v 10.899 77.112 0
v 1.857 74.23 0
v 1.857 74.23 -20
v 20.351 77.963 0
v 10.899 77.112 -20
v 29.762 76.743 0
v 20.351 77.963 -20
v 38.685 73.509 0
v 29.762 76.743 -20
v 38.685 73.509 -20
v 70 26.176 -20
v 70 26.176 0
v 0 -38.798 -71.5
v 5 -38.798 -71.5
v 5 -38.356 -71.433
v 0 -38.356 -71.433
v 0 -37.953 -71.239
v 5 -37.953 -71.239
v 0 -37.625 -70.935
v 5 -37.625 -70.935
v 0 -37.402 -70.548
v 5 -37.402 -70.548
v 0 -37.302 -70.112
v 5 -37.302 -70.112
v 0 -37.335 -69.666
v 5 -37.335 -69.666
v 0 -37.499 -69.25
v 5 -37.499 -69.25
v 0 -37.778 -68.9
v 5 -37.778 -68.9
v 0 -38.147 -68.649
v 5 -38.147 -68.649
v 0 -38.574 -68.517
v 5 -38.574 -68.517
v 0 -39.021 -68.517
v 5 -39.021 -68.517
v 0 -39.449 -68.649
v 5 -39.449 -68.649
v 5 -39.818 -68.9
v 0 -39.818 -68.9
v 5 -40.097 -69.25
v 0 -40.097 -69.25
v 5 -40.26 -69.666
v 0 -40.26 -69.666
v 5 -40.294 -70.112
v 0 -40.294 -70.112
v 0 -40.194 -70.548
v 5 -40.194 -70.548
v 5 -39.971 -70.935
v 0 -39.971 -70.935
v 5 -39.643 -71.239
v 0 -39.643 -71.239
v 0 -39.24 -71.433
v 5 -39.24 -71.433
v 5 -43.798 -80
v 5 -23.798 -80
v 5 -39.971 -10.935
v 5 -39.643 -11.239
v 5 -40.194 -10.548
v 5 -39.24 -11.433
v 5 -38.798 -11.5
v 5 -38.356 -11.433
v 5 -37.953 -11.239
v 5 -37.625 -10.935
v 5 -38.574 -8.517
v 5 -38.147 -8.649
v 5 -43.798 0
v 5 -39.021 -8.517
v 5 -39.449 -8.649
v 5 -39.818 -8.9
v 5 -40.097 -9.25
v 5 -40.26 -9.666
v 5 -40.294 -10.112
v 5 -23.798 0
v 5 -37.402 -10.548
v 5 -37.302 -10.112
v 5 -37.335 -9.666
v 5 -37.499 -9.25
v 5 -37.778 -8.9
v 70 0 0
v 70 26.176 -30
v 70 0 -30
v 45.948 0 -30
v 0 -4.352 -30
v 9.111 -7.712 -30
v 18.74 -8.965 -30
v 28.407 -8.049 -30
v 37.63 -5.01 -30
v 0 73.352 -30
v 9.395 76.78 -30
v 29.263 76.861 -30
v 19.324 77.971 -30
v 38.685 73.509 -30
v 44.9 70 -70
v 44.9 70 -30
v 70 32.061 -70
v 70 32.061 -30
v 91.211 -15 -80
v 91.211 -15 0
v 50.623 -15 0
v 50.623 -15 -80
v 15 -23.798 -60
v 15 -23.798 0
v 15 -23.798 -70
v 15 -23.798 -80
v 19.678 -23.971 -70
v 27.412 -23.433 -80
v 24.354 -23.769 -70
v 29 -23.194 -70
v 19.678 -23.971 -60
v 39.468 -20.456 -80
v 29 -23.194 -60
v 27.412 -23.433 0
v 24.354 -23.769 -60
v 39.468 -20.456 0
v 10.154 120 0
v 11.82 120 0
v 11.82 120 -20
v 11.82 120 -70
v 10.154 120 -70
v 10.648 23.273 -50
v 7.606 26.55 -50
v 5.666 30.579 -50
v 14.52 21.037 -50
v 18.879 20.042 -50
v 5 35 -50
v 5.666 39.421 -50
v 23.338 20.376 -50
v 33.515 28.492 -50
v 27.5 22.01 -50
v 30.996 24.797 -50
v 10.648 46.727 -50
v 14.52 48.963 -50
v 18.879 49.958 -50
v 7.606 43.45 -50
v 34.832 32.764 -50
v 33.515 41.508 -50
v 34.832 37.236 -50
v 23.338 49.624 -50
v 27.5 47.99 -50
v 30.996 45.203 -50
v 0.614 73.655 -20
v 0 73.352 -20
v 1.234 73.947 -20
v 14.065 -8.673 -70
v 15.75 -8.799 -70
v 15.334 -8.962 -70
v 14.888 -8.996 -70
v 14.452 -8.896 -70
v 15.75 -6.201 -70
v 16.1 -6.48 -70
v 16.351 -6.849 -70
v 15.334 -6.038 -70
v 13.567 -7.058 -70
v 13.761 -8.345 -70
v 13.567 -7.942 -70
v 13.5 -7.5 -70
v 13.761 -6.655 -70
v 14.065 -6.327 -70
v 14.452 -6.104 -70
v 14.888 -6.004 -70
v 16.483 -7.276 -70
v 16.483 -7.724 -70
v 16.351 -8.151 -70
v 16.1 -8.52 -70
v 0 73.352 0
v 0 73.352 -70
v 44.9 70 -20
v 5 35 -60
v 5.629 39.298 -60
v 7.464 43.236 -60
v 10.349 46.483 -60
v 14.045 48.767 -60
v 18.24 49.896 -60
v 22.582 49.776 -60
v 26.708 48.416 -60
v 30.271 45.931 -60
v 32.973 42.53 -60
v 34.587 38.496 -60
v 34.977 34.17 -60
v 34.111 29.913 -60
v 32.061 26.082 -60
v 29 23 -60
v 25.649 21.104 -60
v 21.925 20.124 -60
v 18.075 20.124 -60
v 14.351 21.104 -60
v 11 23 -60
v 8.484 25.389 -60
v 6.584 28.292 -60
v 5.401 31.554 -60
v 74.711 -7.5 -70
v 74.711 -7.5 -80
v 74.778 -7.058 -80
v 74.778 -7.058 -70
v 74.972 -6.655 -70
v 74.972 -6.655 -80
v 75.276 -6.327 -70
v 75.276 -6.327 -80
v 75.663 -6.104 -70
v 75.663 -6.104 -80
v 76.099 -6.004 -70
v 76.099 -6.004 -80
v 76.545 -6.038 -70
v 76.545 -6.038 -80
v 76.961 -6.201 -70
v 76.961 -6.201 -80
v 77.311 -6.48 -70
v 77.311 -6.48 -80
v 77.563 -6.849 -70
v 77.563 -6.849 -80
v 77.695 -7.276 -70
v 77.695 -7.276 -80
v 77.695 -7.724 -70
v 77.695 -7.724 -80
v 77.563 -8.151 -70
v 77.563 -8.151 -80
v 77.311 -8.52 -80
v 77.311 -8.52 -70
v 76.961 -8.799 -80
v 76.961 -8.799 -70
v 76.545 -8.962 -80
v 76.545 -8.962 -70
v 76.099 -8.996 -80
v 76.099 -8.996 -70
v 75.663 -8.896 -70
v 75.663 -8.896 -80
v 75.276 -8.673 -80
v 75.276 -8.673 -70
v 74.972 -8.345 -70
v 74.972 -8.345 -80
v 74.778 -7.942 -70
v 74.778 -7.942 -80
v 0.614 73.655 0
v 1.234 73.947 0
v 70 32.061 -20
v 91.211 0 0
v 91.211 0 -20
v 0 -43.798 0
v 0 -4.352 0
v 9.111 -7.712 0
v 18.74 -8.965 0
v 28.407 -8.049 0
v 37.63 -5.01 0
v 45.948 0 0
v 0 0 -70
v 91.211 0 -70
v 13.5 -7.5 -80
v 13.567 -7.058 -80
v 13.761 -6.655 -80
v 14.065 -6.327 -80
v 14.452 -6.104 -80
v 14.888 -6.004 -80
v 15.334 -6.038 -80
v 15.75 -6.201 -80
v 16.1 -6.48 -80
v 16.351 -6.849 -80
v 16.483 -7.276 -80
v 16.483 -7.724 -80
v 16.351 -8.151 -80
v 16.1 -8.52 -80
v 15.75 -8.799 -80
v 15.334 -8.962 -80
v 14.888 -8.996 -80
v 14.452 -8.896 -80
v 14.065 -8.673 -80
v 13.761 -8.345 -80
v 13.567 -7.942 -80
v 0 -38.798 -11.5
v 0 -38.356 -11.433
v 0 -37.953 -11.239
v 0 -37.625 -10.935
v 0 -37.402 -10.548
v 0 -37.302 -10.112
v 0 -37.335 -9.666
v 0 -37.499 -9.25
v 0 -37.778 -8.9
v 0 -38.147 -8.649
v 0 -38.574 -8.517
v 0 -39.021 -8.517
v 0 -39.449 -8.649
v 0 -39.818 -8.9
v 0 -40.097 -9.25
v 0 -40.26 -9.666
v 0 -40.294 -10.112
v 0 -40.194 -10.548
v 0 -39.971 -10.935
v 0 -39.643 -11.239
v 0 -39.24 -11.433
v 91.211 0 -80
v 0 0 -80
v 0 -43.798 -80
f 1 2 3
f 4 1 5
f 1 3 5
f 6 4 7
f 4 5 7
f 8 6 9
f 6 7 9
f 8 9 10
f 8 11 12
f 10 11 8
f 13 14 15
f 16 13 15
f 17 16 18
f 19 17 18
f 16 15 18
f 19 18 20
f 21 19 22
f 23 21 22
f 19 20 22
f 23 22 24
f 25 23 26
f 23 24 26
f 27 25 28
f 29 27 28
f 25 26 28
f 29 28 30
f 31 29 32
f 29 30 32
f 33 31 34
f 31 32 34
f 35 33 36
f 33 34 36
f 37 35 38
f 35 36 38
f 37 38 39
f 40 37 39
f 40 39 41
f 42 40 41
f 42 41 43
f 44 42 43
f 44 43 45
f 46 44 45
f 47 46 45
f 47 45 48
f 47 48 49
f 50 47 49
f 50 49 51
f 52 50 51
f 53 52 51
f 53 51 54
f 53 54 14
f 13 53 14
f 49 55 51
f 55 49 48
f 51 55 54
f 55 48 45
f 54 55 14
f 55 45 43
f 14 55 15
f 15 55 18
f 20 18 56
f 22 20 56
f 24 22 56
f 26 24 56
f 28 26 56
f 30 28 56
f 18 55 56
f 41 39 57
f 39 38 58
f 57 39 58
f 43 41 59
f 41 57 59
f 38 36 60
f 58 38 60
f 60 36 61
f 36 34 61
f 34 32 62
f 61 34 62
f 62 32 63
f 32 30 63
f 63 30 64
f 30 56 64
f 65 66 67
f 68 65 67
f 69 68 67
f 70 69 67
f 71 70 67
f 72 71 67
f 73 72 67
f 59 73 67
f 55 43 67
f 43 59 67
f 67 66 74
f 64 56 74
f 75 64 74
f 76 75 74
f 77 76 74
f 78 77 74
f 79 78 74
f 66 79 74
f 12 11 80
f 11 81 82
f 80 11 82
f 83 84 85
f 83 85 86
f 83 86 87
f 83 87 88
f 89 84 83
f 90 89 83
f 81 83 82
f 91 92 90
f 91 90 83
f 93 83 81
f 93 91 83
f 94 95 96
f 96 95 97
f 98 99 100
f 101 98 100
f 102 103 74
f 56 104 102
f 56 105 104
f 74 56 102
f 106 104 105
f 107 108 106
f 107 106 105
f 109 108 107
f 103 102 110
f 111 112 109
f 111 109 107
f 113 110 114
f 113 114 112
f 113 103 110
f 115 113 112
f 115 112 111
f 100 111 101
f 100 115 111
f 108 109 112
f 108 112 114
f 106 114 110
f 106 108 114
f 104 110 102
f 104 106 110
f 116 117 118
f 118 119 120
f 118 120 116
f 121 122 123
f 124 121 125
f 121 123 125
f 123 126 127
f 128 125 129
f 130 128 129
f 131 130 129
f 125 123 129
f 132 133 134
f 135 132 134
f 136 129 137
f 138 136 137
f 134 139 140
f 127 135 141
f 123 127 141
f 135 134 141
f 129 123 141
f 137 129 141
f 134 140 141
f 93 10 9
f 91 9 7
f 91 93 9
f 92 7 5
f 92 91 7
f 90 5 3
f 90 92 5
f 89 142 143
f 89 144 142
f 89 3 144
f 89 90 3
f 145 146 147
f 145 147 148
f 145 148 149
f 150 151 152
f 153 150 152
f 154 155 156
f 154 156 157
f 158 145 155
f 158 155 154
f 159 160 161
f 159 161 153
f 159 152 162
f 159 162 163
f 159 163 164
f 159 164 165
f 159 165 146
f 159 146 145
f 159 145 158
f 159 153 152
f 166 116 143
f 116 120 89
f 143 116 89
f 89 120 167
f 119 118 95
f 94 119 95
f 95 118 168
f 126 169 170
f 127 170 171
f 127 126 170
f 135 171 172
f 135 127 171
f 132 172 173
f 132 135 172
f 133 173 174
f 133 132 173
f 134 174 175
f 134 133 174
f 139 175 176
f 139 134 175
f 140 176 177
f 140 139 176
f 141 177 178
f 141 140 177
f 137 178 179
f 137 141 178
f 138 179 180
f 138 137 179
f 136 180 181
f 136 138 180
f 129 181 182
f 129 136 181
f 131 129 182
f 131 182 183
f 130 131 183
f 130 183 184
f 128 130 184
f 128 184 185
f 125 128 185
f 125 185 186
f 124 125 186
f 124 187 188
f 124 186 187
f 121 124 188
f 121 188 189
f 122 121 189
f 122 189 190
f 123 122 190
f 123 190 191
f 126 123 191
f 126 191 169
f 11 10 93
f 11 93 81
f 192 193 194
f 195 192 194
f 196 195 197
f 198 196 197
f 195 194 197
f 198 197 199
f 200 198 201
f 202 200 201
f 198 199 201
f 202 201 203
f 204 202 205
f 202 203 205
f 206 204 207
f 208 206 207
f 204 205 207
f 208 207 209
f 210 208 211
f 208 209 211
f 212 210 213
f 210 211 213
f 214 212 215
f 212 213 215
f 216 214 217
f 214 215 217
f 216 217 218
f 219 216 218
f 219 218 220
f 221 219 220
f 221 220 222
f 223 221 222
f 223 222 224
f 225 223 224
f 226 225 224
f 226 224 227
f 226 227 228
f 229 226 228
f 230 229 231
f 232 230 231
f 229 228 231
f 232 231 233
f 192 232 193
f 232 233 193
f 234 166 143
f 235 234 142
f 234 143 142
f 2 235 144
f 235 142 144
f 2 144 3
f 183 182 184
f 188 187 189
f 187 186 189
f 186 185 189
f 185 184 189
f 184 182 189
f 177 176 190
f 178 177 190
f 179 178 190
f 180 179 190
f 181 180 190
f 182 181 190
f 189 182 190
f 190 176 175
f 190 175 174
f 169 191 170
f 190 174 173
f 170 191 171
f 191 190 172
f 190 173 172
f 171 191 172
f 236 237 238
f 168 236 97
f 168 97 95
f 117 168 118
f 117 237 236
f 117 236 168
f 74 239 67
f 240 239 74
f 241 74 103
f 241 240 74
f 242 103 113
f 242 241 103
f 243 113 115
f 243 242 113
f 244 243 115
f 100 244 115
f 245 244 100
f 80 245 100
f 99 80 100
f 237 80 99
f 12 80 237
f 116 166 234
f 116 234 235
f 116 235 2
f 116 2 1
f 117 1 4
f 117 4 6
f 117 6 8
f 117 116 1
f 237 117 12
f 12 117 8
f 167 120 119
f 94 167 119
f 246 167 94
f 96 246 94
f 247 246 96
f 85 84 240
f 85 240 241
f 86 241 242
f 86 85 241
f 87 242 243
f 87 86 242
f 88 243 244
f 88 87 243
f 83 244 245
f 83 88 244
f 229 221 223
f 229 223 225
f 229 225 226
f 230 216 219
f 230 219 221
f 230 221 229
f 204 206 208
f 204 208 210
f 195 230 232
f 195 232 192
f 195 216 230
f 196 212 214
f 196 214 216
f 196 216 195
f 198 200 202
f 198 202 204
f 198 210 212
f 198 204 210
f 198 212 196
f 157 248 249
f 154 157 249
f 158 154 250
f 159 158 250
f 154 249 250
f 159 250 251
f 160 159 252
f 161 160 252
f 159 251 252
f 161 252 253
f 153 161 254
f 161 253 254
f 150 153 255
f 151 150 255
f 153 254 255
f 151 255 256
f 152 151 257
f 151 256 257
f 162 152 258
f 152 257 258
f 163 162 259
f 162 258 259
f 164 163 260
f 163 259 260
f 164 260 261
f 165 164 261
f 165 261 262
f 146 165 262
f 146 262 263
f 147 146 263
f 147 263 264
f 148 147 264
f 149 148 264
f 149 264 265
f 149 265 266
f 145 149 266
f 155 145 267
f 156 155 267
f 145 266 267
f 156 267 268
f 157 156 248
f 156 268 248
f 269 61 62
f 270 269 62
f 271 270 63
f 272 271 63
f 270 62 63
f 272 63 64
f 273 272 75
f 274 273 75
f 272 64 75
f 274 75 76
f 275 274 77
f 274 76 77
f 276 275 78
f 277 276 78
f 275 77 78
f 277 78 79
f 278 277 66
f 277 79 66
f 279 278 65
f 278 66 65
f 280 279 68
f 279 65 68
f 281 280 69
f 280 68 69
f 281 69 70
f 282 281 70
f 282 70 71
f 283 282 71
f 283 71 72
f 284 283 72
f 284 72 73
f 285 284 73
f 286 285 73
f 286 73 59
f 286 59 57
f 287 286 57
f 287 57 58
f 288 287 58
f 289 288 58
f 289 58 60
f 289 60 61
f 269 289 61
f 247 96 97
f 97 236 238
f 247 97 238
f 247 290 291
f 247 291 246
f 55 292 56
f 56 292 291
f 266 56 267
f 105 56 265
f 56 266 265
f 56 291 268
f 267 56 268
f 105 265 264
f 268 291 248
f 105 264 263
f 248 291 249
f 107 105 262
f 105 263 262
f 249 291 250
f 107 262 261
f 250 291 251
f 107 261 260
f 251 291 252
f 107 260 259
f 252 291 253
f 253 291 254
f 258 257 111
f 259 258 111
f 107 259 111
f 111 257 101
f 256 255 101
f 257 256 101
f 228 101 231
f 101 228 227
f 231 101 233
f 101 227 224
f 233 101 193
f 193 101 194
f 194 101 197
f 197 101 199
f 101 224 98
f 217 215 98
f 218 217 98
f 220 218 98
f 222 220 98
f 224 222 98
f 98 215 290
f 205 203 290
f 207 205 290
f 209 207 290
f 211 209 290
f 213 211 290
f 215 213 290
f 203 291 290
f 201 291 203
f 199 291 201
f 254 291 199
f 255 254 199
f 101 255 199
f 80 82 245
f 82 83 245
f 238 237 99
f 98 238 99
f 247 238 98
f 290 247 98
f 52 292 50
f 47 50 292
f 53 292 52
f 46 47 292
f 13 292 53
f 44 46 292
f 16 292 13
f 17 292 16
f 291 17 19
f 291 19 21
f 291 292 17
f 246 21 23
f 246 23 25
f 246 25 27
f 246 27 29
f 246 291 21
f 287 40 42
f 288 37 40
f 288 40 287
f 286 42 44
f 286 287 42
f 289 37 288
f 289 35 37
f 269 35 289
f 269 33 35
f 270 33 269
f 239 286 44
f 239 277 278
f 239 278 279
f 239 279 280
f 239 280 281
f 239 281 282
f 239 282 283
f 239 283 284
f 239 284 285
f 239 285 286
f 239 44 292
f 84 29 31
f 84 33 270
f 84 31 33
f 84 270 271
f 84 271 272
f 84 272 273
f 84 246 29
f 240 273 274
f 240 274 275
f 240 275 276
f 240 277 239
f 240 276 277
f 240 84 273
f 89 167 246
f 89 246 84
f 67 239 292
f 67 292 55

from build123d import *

# Parameters (mm, degrees)
EXTRUDE_1_DEPTH           = 30
EXTRUDE_2_DEPTH           = 210
SKETCH_8_W                = 25
SKETCH_8_H                = 120
EXTRUDE_5_DEPTH           = 70
SKETCH_9_W                = 25
SKETCH_9_H                = 60
EXTRUDE_6_DEPTH           = 60
SKETCH_10_R               = 7.5
CUT_EXTRUDE_3_DEPTH       = 402.372644808
EXTRUDE_7_DEPTH           = 60
EXTRUDE_8_REACH           = 392.16
SKETCH_12_R               = 2.5
SKETCH_14_W               = 125
SKETCH_14_H               = 50
EXTRUDE_9_DEPTH           = 120
SKETCH_15_W               = 70
SKETCH_15_H               = 70
CUT_EXTRUDE_4_DEPTH       = 10
CUT_EXTRUDE_5_DEPTH       = 20
SKETCH_17_R               = 43.471266984
CUT_EXTRUDE_6_DEPTH       = 428.317212384
EXTRUDE_10_DEPTH          = 20
EXTRUDE_11_DEPTH          = 20
CUT_EXTRUDE_7_DEPTH       = 434.012701892
CUT_EXTRUDE_8_DEPTH       = 434.012701892
EXTRUDE_19_REACH          = 446.86
EXTRUDE_20_DEPTH          = 20
EXTRUDE_21_DEPTH          = 20
EXTRUDE_START             = 20
EXTRUDE_22_DEPTH          = 20
CUT_EXTRUDE_9_DEPTH       = 30
CUT_EXTRUDE_11_DEPTH      = 407.201920232
CUT_EXTRUDE_11_DEPTH_BACK = 407.201920232
SKETCH_29_R               = 15
EXTRUDE_23_DEPTH          = 78.203243
SKETCH_33_W               = 30
SKETCH_33_H               = 40
CUT_EXTRUDE_14_DEPTH      = 20
SKETCH_34_W               = 18
SKETCH_34_H               = 35.300600551
CUT_EXTRUDE_15_DEPTH      = 10
CUT_EXTRUDE_16_DEPTH      = 10
SKETCH_36_RX              = 24.05
SKETCH_36_RY              = 15.9
SKETCH_36_R               = 15.9
CUT_EXTRUDE_17_DEPTH      = 4
SKETCH_37_W               = 148.788525811
SKETCH_37_H               = 80
CUT_EXTRUDE_18_DEPTH      = 445.859528391
SKETCH_38_W               = 76.211474189
SKETCH_38_H               = 51.3
CUT_EXTRUDE_20_DEPTH      = 80
CUT_EXTRUDE_START         = -81
CUT_EXTRUDE_21_DEPTH      = 81
CUT_EXTRUDE_22_DEPTH      = 402.372644808
SKETCH_41_W               = 18
SKETCH_41_H               = 10
CUT_EXTRUDE_23_DEPTH      = 60
SKETCH_44_W               = 50
SKETCH_44_H               = 109
EXTRUDE_26_DEPTH          = 15
SKETCH_45_W               = 50
SKETCH_45_H               = 109
EXTRUDE_27_DEPTH          = 15
EXTRUDE_28_DEPTH          = 15
SKETCH_47_W               = 15
SKETCH_47_H               = 50.339258453
CUT_EXTRUDE_24_DEPTH      = 109
CUT_EXTRUDE_25_DEPTH      = 445.859528391
CUT_EXTRUDE_26_DEPTH      = 15
SKETCH_50_W               = 5
SKETCH_50_H               = 80
EXTRUDE_29_DEPTH          = 20
SKETCH_51_R               = 1.5
CUT_EXTRUDE_27_DEPTH      = 20
EXTRUDE_30_DEPTH          = 20
EXTRUDE_31_DEPTH          = 10
SKETCH_54_R               = 1.5
CUT_EXTRUDE_28_DEPTH      = 10


with BuildPart() as part:
    # 草图1 → 凸台-拉伸1 (new body)
    with BuildSketch(Plane(origin=(0, 0, 0), x_dir=(0, 0, -1), z_dir=(1, 0, 0))):
        with BuildLine():
            Line((0, 0), (270, 0))
            Line((270, 0), (270, -100.282814983))
            ThreePointArc((270, -100.282814983), (264.178138298, -118.691056762), (248.830033233, -130.404003019))
            Line((248.830033233, -130.404003019), (142.45524498, -168.69892679))
            ThreePointArc((142.45524498, -168.69892679), (135, -170), (127.54475502, -168.69892679))
            Line((127.54475502, -168.69892679), (21.169966767, -130.404003019))
            ThreePointArc((21.169966767, -130.404003019), (5.821861702, -118.691056762), (0, -100.282814983))
            Line((0, -100.282814983), (0, 0))
        make_face()
    extrude(amount=EXTRUDE_1_DEPTH)

    # 草图2 → 凸台-拉伸2 (add)
    with BuildSketch(Plane(origin=(30, 0, 0), x_dir=(0, 0, -1), z_dir=(1, 0, 0))):
        with BuildLine():
            Line((105, -160.582814983), (105, 0))
            Line((105, 0), (0, 0))
            Line((0, 0), (0, -100.282814983))
            ThreePointArc((0, -100.282814983), (5.821861702, -118.691056762), (21.169966767, -130.404003019))
            Line((21.169966767, -130.404003019), (105, -160.582814983))
        make_face()
        with BuildLine():
            Line((270, 0), (165, 0))
            Line((165, 0), (165, -160.582814983))
            Line((165, -160.582814983), (248.830033233, -130.404003019))
            ThreePointArc((248.830033233, -130.404003019), (264.178138298, -118.691056762), (270, -100.282814983))
            Line((270, -100.282814983), (270, 0))
        make_face()
    extrude(amount=EXTRUDE_2_DEPTH)

    # 草图8 → 凸台-拉伸5 (add)
    with BuildSketch(Plane(origin=(240, 0, 0), x_dir=(0, 0, -1), z_dir=(1, 0, 0))):
        with Locations((92.5, 0)):
            Rectangle(SKETCH_8_W, SKETCH_8_H)
        with Locations((177.5, 0)):
            Rectangle(SKETCH_8_W, SKETCH_8_H)
    extrude(amount=EXTRUDE_5_DEPTH)

    # 草图9 → 凸台-拉伸6 (add)
    with BuildSketch(Plane.ZY.offset(-240)):
        with Locations((-92.5, 30)):
            Rectangle(SKETCH_9_W, SKETCH_9_H)
        with Locations((-177.5, 30)):
            Rectangle(SKETCH_9_W, SKETCH_9_H)
    extrude(amount=EXTRUDE_6_DEPTH)

    # 草图10 → 切除-拉伸3 (cut, through all)
    with BuildSketch(Plane.XY.offset(-80)):
        with Locations((270, 30)):
            Circle(SKETCH_10_R)
    extrude(amount=-CUT_EXTRUDE_3_DEPTH, mode=Mode.SUBTRACT)

    # 草图11 → 凸台-拉伸7 (add)
    with BuildSketch(Plane(origin=(0, 0, -105), x_dir=(-1, 0, 0), z_dir=(0, 0, -1))):
        with BuildLine():
            Line((-30, -40), (-30, -160.582814983))
            Line((-30, -160.582814983), (-108.203242822, -160.582814983))
            ThreePointArc((-108.203242822, -160.582814983), (-60.24964282, -106.032303748), (-30, -40))
        make_face()
    extrude(amount=EXTRUDE_7_DEPTH)

    # 草图12 → 凸台-拉伸8 (add, up to next)
    with BuildSketch(Plane.XY.offset(-165), mode=Mode.PRIVATE) as extrude_8_sk1:
        with Locations(Location((70, -45, 0), (0, 0, 180))):
            Circle(SKETCH_12_R)
    extrude_8_tool1 = extrude(extrude_8_sk1.sketch, amount=EXTRUDE_8_REACH, mode=Mode.PRIVATE) - part.part
    add(extrude_8_tool1.solids().sort_by_distance((70, -45, -165))[0])

    # 草图14 → 凸台-拉伸9 (add)
    with BuildSketch(Plane(origin=(0, 0, 0), x_dir=(1, 0, 0), z_dir=(0, 1, 0))):
        with Locations((62.5, 225)):
            Rectangle(SKETCH_14_W, SKETCH_14_H)
        with Locations((62.5, 45)):
            Rectangle(SKETCH_14_W, SKETCH_14_H)
    extrude(amount=EXTRUDE_9_DEPTH)

    # 草图15 → 切除-拉伸4 (cut)
    with BuildSketch(Plane.XY.offset(-20)):
        with Locations((35, 35)):
            Rectangle(SKETCH_15_W, SKETCH_15_H)
    extrude(amount=-CUT_EXTRUDE_4_DEPTH, mode=Mode.SUBTRACT)

    # 草图16 → 切除-拉伸5 (cut)
    with BuildSketch(Plane.XY.offset(-30)):
        Polygon((35, 15), (5, 15), (5, 55), (35, 55), (35, 35), align=None)
    extrude(amount=-CUT_EXTRUDE_5_DEPTH, mode=Mode.SUBTRACT)

    # 草图17 → 切除-拉伸6 (cut, through all)
    with BuildSketch(Plane.XY.offset(-30)):
        with Locations((19.5, 34.5)):
            Circle(SKETCH_17_R)
    extrude(amount=CUT_EXTRUDE_6_DEPTH, mode=Mode.SUBTRACT)

    # 草图18 → 凸台-拉伸10 (add)
    with BuildSketch(Plane.XY.offset(-20)):
        Polygon((11.819921283, 120), (91.211474189, 0), (87.317867735, 0), (10.741661946, 115.744614613), align=None)
    extrude(amount=EXTRUDE_10_DEPTH)

    # 草图19 → 凸台-拉伸11 (add)
    with BuildSketch(Plane.XY.offset(-20)):
        with BuildLine():
            Line((1.857343832, 74.230186717), (10.856035233, 115.571739869))
            Line((10.856035233, 115.571739869), (10.741661946, 115.744614613))
            Line((10.741661946, 115.744614613), (11.819921283, 120))
            Line((11.819921283, 120), (10.153664863, 120))
            Line((10.153664863, 120), (0, 73.352297914))
            ThreePointArc((0, 73.352297914), (0.923485284, 73.80221564), (1.857343832, 74.230186717))
        make_face()
    extrude(amount=EXTRUDE_11_DEPTH)

    # 草图20 → 切除-拉伸7 (cut, through all)
    with BuildSketch(Plane.XY.offset(-20)):
        Polygon((0, 120), (0, 73.352297914), (10.153664863, 120), align=None)
    extrude(amount=-CUT_EXTRUDE_7_DEPTH, mode=Mode.SUBTRACT)

    # 草图22 → 切除-拉伸8 (cut, through all)
    with BuildSketch(Plane.XY.offset(-20)):
        Polygon((44.899734993, 70), (70, 32.061054476), (91.211474189, 0), (125, 0), (125, 120), (11.819921283, 120), align=None)
    extrude(amount=-CUT_EXTRUDE_8_DEPTH, mode=Mode.SUBTRACT)

    # 草图23 → 凸台-拉伸19 (add, up to next)
    with BuildSketch(Plane.XY, mode=Mode.PRIVATE) as extrude_19_sk1:
        with BuildLine():
            Line((87.317867735, 0), (91.211474189, 0))
            Line((91.211474189, 0), (11.819921283, 120))
            Line((11.819921283, 120), (10.153664863, 120))
            Line((10.153664863, 120), (0, 73.352297914))
            ThreePointArc((0, 73.352297914), (0.923485284, 73.80221564), (1.857343832, 74.230186717))
            Line((1.857343832, 74.230186717), (10.856035233, 115.571739869))
            Line((10.856035233, 115.571739869), (87.317867735, 0))
        make_face()
    extrude_19_tool1 = extrude(extrude_19_sk1.sketch, amount=-EXTRUDE_19_REACH, mode=Mode.PRIVATE) - part.part
    add(extrude_19_tool1.solids().sort_by_distance((89.264671, 1.5073, 0))[0])

    # 草图24 → 凸台-拉伸20 (add)
    with BuildSketch(Plane.XY.offset(-20)):
        Polygon((87.317867735, 0), (70, 26.175884614), (70, 0), align=None)
    extrude(amount=EXTRUDE_20_DEPTH)

    # 草图25 → 凸台-拉伸21 (add)
    with BuildSketch(Plane.XY.offset(-20)):
        with BuildLine():
            Line((38.684579851, 73.509011127), (10.856035233, 115.571739869))
            Line((10.856035233, 115.571739869), (1.857343832, 74.230186717))
            ThreePointArc((1.857343832, 74.230186717), (20.351120273, 77.962934179), (38.684579851, 73.509011127))
        make_face()
    extrude(amount=EXTRUDE_21_DEPTH)

    # 草图26 → 凸台-拉伸22 (add)
    with BuildSketch(Plane(origin=(0, 0, -250), x_dir=(-1, 0, 0), z_dir=(0, 0, -1)).offset(EXTRUDE_START)):
        with BuildLine():
            Line((-70, 26.175884614), (-38.684579851, 73.509011127))
            ThreePointArc((-38.684579851, 73.509011127), (-19.323897117, 77.970910285), (0, 73.352297914))
            Line((0, 73.352297914), (-10.153664863, 120))
            Line((-10.153664863, 120), (-11.819921283, 120))
            Line((-11.819921283, 120), (-91.211474189, 0))
            Line((-91.211474189, 0), (-240, 0))
            Line((-240, 0), (-240, -100.282814983))
            Line((-240, -100.282814983), (0, -100.282814983))
            Line((0, -100.282814983), (0, -4.352297914))
            ThreePointArc((0, -4.352297914), (-23.599339693, -8.77755154), (-45.948082222, 0))
            Line((-45.948082222, 0), (-70, 0))
            Line((-70, 0), (-70, 26.175884614))
        make_face()
    extrude(amount=-EXTRUDE_22_DEPTH)

    # 草图27 → 切除-拉伸9 (cut)
    with BuildSketch(Plane(origin=(0, 0, -270), x_dir=(-1, 0, 0), z_dir=(0, 0, -1))):
        with BuildLine():
            Line((-38.684579851, 73.509011127), (-70, 26.175884614))
            Line((-70, 26.175884614), (-70, 0))
            Line((-70, 0), (-45.948082222, 0))
            ThreePointArc((-45.948082222, 0), (-23.599339693, -8.77755154), (0, -4.352297914))
            Line((0, -4.352297914), (0, 73.352297914))
            ThreePointArc((0, 73.352297914), (-19.323897117, 77.970910285), (-38.684579851, 73.509011127))
        make_face()
    extrude(amount=-CUT_EXTRUDE_9_DEPTH, mode=Mode.SUBTRACT)

    # 草图29 → 切除-拉伸11 (cut, two sides: drawn at the far end of the back side and taken through both)
    with BuildSketch(Plane(origin=(0, 0, -70), x_dir=(-1, 0, 0), z_dir=(0, 0, -1)).offset(-CUT_EXTRUDE_11_DEPTH_BACK)):
        with Locations((-20, 35)):
            Circle(SKETCH_29_R)
    extrude(amount=CUT_EXTRUDE_11_DEPTH + CUT_EXTRUDE_11_DEPTH_BACK, mode=Mode.SUBTRACT)

    # 草图30 → 凸台-拉伸23 (add)
    with BuildSketch(Plane(origin=(30, 0, 0), x_dir=(0, 0, -1), z_dir=(1, 0, 0))):
        with BuildLine():
            Line((142.45524498, -168.69892679), (165, -160.582814983))
            Line((165, -160.582814983), (105, -160.582814983))
            Line((105, -160.582814983), (127.54475502, -168.69892679))
            ThreePointArc((127.54475502, -168.69892679), (135, -170), (142.45524498, -168.69892679))
        make_face()
    extrude(amount=EXTRUDE_23_DEPTH)

    # 草图33 → 切除-拉伸14 (cut)
    with BuildSketch(Plane(origin=(0, 0, -240), x_dir=(-1, 0, 0), z_dir=(0, 0, -1))):
        with Locations((-20, 35)):
            Rectangle(SKETCH_33_W, SKETCH_33_H)
    extrude(amount=-CUT_EXTRUDE_14_DEPTH, mode=Mode.SUBTRACT)

    # 草图34 → 切除-拉伸15 (cut)
    with BuildSketch(Plane.XY.offset(-200)):
        with Locations((20, 17.650300276)):
            Rectangle(SKETCH_34_W, SKETCH_34_H)
    extrude(amount=-CUT_EXTRUDE_15_DEPTH, mode=Mode.SUBTRACT)

    # 草图35 → 切除-拉伸16 (cut)
    with BuildSketch(Plane(origin=(0, 0, -70), x_dir=(-1, 0, 0), z_dir=(0, 0, -1))):
        with BuildLine():
            Line((-11, 0), (-11, 23))
            ThreePointArc((-11, 23), (-20, 20), (-29, 23))
            Line((-29, 23), (-29, 0))
            Line((-29, 0), (-11, 0))
        make_face()
    extrude(amount=-CUT_EXTRUDE_16_DEPTH, mode=Mode.SUBTRACT)

    # 草图36 → 切除-拉伸17 (cut)
    # profile 1 of 6: a face of its own
    with BuildSketch(Plane.ZY):
        with Locations((-235.69166945, -100.008005659)):
            Ellipse(SKETCH_36_RX, SKETCH_36_RY)
        with Locations((-235.69166945, -100.008005659)):
            Circle(SKETCH_36_R, mode=Mode.SUBTRACT)
    # profile 2 of 6: a face of its own
    with BuildSketch(Plane.ZY):
        with Locations((-235.69166945, -100.008005659)):
            Ellipse(SKETCH_36_RX, SKETCH_36_RY)
        with Locations((-235.69166945, -100.008005659)):
            Circle(SKETCH_36_R, mode=Mode.SUBTRACT)
    # profile 3 of 6: a face of its own
    with BuildSketch(Plane.ZY):
        with Locations((-235.69166945, -100.008005659)):
            Circle(SKETCH_36_R)
    # profile 4 of 6: a face of its own
    with BuildSketch(Plane.ZY):
        with Locations(Location((-34.30833055, -100.008005659), (0, 0, 180))):
            Ellipse(SKETCH_36_RX, SKETCH_36_RY)
        with Locations((-34.30833055, -100.008005659)):
            Circle(SKETCH_36_R, mode=Mode.SUBTRACT)
    # profile 5 of 6: a face of its own
    with BuildSketch(Plane.ZY):
        with Locations(Location((-34.30833055, -100.008005659), (0, 0, 180))):
            Ellipse(SKETCH_36_RX, SKETCH_36_RY)
        with Locations((-34.30833055, -100.008005659)):
            Circle(SKETCH_36_R, mode=Mode.SUBTRACT)
    # profile 6 of 6: a face of its own
    with BuildSketch(Plane.ZY):
        with Locations((-34.30833055, -100.008005659)):
            Circle(SKETCH_36_R)
    extrude(amount=-CUT_EXTRUDE_17_DEPTH, mode=Mode.SUBTRACT)

    # 草图37 → 切除-拉伸18 (cut, through all)
    with BuildSketch(Plane(origin=(0, 0, 0), x_dir=(1, 0, 0), z_dir=(0, 1, 0))):
        with Locations((165.605737095, 40)):
            Rectangle(SKETCH_37_W, SKETCH_37_H)
        with Locations((165.605737095, 230)):
            Rectangle(SKETCH_37_W, SKETCH_37_H)
    extrude(amount=-CUT_EXTRUDE_18_DEPTH, mode=Mode.SUBTRACT)

    # 草图38 → 切除-拉伸20 (cut)
    with BuildSketch(Plane.XY):
        with Locations((53.105737095, -125.932814983)):
            Rectangle(SKETCH_38_W, SKETCH_38_H)
        Polygon((91.211474189, -15), (76.211474189, -15), (76.211474189, -85.282814983), (15, -85.282814983), (15, -100.282814983), (91.211474189, -100.282814983), align=None)
        with BuildLine():
            ThreePointArc((15, -23.79784784), (33.51949079, -22.265684535), (50.622966805, -15))
            Line((50.622966805, -15), (70, -15))
            Line((70, -15), (76.211474189, -15))
            Line((76.211474189, -15), (76.211474189, -85.282814983))
            Line((76.211474189, -85.282814983), (15, -85.282814983))
            Line((15, -85.282814983), (15, -23.79784784))
        make_face()
    extrude(amount=-CUT_EXTRUDE_20_DEPTH, mode=Mode.SUBTRACT)

    # 草图39 → 切除-拉伸21 (cut)
    with BuildSketch(Plane(origin=(0, 0, -270), x_dir=(-1, 0, 0), z_dir=(0, 0, -1)).offset(CUT_EXTRUDE_START)):
        with BuildLine():
            Line((-180, 60), (-310, 60))
            Line((-310, 60), (-310, -60))
            Line((-310, -60), (-240, -60))
            Line((-240, -60), (-240, -151.582814983))
            Line((-240, -151.582814983), (-15, -151.582814983))
            Line((-15, -151.582814983), (-15, -23.79784784))
            ThreePointArc((-15, -23.79784784), (-33.51949079, -22.265684535), (-50.622966805, -15))
            Line((-50.622966805, -15), (-91.211474189, -15))
            Line((-91.211474189, -15), (-91.211474189, 0))
            Line((-91.211474189, 0), (-180, 0))
            Line((-180, 0), (-180, 60))
        make_face()
    extrude(amount=CUT_EXTRUDE_21_DEPTH, mode=Mode.SUBTRACT)

    # 草图40 → 切除-拉伸22 (cut, through all)
    with BuildSketch(Plane.XY.offset(-80)):
        with BuildLine():
            Line((74.655848302, -141.582814983), (40, -141.582814983))
            Line((40, -141.582814983), (40, -91.24355653))
            ThreePointArc((40, -91.24355653), (55.843697078, -117.43499557), (74.655848302, -141.582814983))
        make_face()
    extrude(amount=-CUT_EXTRUDE_22_DEPTH, mode=Mode.SUBTRACT)

    # 草图41 → 切除-拉伸23 (cut)
    with BuildSketch(Plane(origin=(0, 0, 0), x_dir=(1, 0, 0), z_dir=(0, 1, 0))):
        with Locations((20, 65)):
            Rectangle(SKETCH_41_W, SKETCH_41_H)
        with Locations((20, 205)):
            Rectangle(SKETCH_41_W, SKETCH_41_H)
    extrude(amount=-CUT_EXTRUDE_23_DEPTH, mode=Mode.SUBTRACT)

    # 草图44 → 凸台-拉伸26 (add)
    with BuildSketch(Plane(origin=(0, 60, 0), x_dir=(1, 0, 0), z_dir=(0, 1, 0))):
        with Locations((285, 134.5)):
            Rectangle(SKETCH_44_W, SKETCH_44_H)
    extrude(amount=EXTRUDE_26_DEPTH)

    # 草图45 → 凸台-拉伸27 (add)
    with BuildSketch(Plane.XZ.offset(60)):
        with Locations((285, -134.5)):
            Rectangle(SKETCH_45_W, SKETCH_45_H)
    extrude(amount=EXTRUDE_27_DEPTH)

    # 草图46 → 凸台-拉伸28 (add)
    with BuildSketch(Plane(origin=(240, 0, 0), x_dir=(0, 0, -1), z_dir=(1, 0, 0))):
        Polygon((80, -151.582814983), (105, -160.582814983), (165, -160.582814983), (189, -151.942814983), (189, -130.582814983), (80, -130.582814983), align=None)
    extrude(amount=EXTRUDE_28_DEPTH)

    # 草图47 → 切除-拉伸24 (cut)
    with BuildSketch(Plane(origin=(0, 0, -189), x_dir=(-1, 0, 0), z_dir=(0, 0, -1))):
        with Locations((-32.5, -116.413185757)):
            Rectangle(SKETCH_47_W, SKETCH_47_H)
    extrude(amount=-CUT_EXTRUDE_24_DEPTH, mode=Mode.SUBTRACT)

    # 草图48 → 切除-拉伸25 (cut, through all)
    with BuildSketch(Plane(origin=(310, 0, 0), x_dir=(0, 0, -1), z_dir=(1, 0, 0))):
        Polygon((270, 120), (80, 120), (80, -151.582814983), (80, -184.430780579), (270, -184.430780579), (270, -151.582814983), align=None)
    extrude(amount=-CUT_EXTRUDE_25_DEPTH, mode=Mode.SUBTRACT)

    # 草图49 → 切除-拉伸26 (cut)
    with BuildSketch(Plane.ZY):
        with BuildLine():
            Line((-70, -23.79784784), (-60, -23.79784784))
            Line((-60, -23.79784784), (0, -23.79784784))
            Line((0, -23.79784784), (0, -100.282814983))
            ThreePointArc((0, -100.282814983), (-5.821861702, -118.691056762), (-21.169966767, -130.404003019))
            Line((-21.169966767, -130.404003019), (-80, -151.582814983))
            Line((-80, -151.582814983), (-80, -23.79784784))
            Line((-80, -23.79784784), (-70, -23.79784784))
        make_face()
    extrude(amount=-CUT_EXTRUDE_26_DEPTH, mode=Mode.SUBTRACT)

    # 草图50 → 凸台-拉伸29 (add)
    with BuildSketch(Plane.XZ.offset(23.79784784)):
        with Locations((2.5, -40)):
            Rectangle(SKETCH_50_W, SKETCH_50_H)
    extrude(amount=EXTRUDE_29_DEPTH)

    # 草图51 → 切除-拉伸27 (cut)
    with BuildSketch(Plane(origin=(5, 0, 0), x_dir=(0, 0, -1), z_dir=(1, 0, 0))):
        with Locations((70, -38.79784784)):
            Circle(SKETCH_51_R)
        with Locations((10, -38.79784784)):
            Circle(SKETCH_51_R)
    extrude(amount=-CUT_EXTRUDE_27_DEPTH, mode=Mode.SUBTRACT)

    # 草图52 → 凸台-拉伸30 (add)
    with BuildSketch(Plane.XY.offset(-30)):
        Polygon((35, 35), (35, 55), (5, 55), (5, 35), (5, 15), (35, 15), align=None)
    extrude(amount=-EXTRUDE_30_DEPTH)

    # 草图53 → 凸台-拉伸31 (add)
    with BuildSketch(Plane(origin=(0, 0, -70), x_dir=(-1, 0, 0), z_dir=(0, 0, -1))):
        with BuildLine():
            ThreePointArc((-29, 23), (-20, 20), (-11, 23))
            ThreePointArc((-11, 23), (-6.583592135, 28.291796068), (-5, 35))
            ThreePointArc((-5, 35), (-26.708203932, 48.416407865), (-29, 23))
        make_face()
        with BuildLine():
            ThreePointArc((-29, -23.19435902), (-22.018144096, -23.91701818), (-15, -23.79784784))
            Line((-15, -23.79784784), (-11, -23.79784784))
            Line((-11, -23.79784784), (-11, 0))
            Line((-11, 0), (-11, 23))
            ThreePointArc((-11, 23), (-20, 20), (-29, 23))
            Line((-29, 23), (-29, 0))
            Line((-29, 0), (-29, -23.19435902))
        make_face()
    extrude(amount=-EXTRUDE_31_DEPTH)

    # 草图54 → 切除-拉伸28 (cut)
    with BuildSketch(Plane(origin=(0, 0, -80), x_dir=(-1, 0, 0), z_dir=(0, 0, -1))):
        with Locations((-76.211474189, -7.5)):
            Circle(SKETCH_54_R)
        with Locations((-15, -7.5)):
            Circle(SKETCH_54_R)
    extrude(amount=-CUT_EXTRUDE_28_DEPTH, mode=Mode.SUBTRACT)


solid = part.part
